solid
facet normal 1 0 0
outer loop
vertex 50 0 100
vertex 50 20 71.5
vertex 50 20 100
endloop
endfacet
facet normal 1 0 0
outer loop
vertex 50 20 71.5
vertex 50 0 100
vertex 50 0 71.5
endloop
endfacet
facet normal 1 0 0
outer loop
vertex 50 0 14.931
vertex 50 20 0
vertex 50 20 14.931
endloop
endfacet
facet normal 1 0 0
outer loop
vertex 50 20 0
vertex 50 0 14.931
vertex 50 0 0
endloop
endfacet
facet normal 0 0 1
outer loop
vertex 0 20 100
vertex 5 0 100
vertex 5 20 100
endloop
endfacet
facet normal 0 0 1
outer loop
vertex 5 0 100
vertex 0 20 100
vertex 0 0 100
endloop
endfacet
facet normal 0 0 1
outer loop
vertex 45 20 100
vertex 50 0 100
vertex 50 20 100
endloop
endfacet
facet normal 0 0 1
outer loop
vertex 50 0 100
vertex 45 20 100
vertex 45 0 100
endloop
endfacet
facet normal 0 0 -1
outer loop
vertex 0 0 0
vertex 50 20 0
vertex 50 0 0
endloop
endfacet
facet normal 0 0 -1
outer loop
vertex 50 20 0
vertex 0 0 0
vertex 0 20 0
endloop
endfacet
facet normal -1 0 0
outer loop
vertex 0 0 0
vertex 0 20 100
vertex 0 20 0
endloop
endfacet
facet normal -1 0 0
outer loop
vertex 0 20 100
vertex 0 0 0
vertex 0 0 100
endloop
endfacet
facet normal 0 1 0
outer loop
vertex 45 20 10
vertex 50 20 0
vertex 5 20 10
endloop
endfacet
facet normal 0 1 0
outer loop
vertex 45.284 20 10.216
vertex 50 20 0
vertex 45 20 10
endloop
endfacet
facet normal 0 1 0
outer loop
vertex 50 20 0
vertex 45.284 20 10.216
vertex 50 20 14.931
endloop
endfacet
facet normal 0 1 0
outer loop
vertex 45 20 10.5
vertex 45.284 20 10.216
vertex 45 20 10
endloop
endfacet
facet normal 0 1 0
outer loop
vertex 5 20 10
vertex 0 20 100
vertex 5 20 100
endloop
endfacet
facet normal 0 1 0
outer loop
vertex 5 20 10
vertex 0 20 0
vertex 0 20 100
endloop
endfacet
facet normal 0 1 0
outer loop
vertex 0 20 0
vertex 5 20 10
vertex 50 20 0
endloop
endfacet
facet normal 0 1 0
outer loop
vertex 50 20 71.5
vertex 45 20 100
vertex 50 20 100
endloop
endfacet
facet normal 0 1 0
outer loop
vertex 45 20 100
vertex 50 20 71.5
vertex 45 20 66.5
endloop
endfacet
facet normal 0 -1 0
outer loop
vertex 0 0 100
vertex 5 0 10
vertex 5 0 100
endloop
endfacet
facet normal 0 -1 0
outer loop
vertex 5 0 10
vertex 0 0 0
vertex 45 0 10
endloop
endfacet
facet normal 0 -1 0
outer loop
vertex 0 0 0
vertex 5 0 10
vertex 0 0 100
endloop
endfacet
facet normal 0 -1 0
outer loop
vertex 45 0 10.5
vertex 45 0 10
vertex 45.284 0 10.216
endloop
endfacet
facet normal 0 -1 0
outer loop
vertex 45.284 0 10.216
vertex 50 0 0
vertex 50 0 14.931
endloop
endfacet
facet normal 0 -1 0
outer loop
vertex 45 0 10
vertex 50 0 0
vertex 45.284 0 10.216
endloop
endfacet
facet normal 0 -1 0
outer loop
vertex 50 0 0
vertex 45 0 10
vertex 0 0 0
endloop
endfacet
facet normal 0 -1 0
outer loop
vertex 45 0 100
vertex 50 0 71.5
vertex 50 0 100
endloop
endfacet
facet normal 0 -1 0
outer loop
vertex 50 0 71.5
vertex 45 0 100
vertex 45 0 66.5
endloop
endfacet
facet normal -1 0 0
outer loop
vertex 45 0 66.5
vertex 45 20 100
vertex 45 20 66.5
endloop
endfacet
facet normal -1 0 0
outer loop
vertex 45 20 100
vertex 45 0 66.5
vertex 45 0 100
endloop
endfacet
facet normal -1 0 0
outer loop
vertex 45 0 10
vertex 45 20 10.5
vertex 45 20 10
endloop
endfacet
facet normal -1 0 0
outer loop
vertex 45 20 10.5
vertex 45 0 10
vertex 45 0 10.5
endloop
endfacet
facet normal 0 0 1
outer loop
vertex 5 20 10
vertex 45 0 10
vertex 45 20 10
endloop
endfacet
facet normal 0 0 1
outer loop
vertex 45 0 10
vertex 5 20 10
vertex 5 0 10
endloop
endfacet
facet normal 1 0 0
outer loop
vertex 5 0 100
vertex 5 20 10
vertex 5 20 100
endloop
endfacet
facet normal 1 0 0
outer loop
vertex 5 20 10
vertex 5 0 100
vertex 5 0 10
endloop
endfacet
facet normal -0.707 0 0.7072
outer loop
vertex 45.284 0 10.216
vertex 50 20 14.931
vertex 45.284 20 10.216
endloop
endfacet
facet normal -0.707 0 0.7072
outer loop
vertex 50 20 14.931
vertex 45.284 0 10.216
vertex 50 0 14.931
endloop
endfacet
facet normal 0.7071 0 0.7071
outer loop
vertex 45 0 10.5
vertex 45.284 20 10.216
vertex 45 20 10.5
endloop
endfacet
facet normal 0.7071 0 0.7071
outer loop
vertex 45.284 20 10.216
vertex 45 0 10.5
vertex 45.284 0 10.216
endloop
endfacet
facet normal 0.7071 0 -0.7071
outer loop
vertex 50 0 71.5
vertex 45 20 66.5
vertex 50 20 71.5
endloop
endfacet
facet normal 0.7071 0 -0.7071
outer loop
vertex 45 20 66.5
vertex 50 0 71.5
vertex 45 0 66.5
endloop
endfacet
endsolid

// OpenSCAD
difference() {
    cube(size=[50, 20, 100]);
    translate([5, -5, 10]) 
        cube(size=[40, 30, 100]);
    translate([17, -5, 38.5])
        rotate([0, 45, 0]) 
            #cube(size=[40, 30, 100]);
}
